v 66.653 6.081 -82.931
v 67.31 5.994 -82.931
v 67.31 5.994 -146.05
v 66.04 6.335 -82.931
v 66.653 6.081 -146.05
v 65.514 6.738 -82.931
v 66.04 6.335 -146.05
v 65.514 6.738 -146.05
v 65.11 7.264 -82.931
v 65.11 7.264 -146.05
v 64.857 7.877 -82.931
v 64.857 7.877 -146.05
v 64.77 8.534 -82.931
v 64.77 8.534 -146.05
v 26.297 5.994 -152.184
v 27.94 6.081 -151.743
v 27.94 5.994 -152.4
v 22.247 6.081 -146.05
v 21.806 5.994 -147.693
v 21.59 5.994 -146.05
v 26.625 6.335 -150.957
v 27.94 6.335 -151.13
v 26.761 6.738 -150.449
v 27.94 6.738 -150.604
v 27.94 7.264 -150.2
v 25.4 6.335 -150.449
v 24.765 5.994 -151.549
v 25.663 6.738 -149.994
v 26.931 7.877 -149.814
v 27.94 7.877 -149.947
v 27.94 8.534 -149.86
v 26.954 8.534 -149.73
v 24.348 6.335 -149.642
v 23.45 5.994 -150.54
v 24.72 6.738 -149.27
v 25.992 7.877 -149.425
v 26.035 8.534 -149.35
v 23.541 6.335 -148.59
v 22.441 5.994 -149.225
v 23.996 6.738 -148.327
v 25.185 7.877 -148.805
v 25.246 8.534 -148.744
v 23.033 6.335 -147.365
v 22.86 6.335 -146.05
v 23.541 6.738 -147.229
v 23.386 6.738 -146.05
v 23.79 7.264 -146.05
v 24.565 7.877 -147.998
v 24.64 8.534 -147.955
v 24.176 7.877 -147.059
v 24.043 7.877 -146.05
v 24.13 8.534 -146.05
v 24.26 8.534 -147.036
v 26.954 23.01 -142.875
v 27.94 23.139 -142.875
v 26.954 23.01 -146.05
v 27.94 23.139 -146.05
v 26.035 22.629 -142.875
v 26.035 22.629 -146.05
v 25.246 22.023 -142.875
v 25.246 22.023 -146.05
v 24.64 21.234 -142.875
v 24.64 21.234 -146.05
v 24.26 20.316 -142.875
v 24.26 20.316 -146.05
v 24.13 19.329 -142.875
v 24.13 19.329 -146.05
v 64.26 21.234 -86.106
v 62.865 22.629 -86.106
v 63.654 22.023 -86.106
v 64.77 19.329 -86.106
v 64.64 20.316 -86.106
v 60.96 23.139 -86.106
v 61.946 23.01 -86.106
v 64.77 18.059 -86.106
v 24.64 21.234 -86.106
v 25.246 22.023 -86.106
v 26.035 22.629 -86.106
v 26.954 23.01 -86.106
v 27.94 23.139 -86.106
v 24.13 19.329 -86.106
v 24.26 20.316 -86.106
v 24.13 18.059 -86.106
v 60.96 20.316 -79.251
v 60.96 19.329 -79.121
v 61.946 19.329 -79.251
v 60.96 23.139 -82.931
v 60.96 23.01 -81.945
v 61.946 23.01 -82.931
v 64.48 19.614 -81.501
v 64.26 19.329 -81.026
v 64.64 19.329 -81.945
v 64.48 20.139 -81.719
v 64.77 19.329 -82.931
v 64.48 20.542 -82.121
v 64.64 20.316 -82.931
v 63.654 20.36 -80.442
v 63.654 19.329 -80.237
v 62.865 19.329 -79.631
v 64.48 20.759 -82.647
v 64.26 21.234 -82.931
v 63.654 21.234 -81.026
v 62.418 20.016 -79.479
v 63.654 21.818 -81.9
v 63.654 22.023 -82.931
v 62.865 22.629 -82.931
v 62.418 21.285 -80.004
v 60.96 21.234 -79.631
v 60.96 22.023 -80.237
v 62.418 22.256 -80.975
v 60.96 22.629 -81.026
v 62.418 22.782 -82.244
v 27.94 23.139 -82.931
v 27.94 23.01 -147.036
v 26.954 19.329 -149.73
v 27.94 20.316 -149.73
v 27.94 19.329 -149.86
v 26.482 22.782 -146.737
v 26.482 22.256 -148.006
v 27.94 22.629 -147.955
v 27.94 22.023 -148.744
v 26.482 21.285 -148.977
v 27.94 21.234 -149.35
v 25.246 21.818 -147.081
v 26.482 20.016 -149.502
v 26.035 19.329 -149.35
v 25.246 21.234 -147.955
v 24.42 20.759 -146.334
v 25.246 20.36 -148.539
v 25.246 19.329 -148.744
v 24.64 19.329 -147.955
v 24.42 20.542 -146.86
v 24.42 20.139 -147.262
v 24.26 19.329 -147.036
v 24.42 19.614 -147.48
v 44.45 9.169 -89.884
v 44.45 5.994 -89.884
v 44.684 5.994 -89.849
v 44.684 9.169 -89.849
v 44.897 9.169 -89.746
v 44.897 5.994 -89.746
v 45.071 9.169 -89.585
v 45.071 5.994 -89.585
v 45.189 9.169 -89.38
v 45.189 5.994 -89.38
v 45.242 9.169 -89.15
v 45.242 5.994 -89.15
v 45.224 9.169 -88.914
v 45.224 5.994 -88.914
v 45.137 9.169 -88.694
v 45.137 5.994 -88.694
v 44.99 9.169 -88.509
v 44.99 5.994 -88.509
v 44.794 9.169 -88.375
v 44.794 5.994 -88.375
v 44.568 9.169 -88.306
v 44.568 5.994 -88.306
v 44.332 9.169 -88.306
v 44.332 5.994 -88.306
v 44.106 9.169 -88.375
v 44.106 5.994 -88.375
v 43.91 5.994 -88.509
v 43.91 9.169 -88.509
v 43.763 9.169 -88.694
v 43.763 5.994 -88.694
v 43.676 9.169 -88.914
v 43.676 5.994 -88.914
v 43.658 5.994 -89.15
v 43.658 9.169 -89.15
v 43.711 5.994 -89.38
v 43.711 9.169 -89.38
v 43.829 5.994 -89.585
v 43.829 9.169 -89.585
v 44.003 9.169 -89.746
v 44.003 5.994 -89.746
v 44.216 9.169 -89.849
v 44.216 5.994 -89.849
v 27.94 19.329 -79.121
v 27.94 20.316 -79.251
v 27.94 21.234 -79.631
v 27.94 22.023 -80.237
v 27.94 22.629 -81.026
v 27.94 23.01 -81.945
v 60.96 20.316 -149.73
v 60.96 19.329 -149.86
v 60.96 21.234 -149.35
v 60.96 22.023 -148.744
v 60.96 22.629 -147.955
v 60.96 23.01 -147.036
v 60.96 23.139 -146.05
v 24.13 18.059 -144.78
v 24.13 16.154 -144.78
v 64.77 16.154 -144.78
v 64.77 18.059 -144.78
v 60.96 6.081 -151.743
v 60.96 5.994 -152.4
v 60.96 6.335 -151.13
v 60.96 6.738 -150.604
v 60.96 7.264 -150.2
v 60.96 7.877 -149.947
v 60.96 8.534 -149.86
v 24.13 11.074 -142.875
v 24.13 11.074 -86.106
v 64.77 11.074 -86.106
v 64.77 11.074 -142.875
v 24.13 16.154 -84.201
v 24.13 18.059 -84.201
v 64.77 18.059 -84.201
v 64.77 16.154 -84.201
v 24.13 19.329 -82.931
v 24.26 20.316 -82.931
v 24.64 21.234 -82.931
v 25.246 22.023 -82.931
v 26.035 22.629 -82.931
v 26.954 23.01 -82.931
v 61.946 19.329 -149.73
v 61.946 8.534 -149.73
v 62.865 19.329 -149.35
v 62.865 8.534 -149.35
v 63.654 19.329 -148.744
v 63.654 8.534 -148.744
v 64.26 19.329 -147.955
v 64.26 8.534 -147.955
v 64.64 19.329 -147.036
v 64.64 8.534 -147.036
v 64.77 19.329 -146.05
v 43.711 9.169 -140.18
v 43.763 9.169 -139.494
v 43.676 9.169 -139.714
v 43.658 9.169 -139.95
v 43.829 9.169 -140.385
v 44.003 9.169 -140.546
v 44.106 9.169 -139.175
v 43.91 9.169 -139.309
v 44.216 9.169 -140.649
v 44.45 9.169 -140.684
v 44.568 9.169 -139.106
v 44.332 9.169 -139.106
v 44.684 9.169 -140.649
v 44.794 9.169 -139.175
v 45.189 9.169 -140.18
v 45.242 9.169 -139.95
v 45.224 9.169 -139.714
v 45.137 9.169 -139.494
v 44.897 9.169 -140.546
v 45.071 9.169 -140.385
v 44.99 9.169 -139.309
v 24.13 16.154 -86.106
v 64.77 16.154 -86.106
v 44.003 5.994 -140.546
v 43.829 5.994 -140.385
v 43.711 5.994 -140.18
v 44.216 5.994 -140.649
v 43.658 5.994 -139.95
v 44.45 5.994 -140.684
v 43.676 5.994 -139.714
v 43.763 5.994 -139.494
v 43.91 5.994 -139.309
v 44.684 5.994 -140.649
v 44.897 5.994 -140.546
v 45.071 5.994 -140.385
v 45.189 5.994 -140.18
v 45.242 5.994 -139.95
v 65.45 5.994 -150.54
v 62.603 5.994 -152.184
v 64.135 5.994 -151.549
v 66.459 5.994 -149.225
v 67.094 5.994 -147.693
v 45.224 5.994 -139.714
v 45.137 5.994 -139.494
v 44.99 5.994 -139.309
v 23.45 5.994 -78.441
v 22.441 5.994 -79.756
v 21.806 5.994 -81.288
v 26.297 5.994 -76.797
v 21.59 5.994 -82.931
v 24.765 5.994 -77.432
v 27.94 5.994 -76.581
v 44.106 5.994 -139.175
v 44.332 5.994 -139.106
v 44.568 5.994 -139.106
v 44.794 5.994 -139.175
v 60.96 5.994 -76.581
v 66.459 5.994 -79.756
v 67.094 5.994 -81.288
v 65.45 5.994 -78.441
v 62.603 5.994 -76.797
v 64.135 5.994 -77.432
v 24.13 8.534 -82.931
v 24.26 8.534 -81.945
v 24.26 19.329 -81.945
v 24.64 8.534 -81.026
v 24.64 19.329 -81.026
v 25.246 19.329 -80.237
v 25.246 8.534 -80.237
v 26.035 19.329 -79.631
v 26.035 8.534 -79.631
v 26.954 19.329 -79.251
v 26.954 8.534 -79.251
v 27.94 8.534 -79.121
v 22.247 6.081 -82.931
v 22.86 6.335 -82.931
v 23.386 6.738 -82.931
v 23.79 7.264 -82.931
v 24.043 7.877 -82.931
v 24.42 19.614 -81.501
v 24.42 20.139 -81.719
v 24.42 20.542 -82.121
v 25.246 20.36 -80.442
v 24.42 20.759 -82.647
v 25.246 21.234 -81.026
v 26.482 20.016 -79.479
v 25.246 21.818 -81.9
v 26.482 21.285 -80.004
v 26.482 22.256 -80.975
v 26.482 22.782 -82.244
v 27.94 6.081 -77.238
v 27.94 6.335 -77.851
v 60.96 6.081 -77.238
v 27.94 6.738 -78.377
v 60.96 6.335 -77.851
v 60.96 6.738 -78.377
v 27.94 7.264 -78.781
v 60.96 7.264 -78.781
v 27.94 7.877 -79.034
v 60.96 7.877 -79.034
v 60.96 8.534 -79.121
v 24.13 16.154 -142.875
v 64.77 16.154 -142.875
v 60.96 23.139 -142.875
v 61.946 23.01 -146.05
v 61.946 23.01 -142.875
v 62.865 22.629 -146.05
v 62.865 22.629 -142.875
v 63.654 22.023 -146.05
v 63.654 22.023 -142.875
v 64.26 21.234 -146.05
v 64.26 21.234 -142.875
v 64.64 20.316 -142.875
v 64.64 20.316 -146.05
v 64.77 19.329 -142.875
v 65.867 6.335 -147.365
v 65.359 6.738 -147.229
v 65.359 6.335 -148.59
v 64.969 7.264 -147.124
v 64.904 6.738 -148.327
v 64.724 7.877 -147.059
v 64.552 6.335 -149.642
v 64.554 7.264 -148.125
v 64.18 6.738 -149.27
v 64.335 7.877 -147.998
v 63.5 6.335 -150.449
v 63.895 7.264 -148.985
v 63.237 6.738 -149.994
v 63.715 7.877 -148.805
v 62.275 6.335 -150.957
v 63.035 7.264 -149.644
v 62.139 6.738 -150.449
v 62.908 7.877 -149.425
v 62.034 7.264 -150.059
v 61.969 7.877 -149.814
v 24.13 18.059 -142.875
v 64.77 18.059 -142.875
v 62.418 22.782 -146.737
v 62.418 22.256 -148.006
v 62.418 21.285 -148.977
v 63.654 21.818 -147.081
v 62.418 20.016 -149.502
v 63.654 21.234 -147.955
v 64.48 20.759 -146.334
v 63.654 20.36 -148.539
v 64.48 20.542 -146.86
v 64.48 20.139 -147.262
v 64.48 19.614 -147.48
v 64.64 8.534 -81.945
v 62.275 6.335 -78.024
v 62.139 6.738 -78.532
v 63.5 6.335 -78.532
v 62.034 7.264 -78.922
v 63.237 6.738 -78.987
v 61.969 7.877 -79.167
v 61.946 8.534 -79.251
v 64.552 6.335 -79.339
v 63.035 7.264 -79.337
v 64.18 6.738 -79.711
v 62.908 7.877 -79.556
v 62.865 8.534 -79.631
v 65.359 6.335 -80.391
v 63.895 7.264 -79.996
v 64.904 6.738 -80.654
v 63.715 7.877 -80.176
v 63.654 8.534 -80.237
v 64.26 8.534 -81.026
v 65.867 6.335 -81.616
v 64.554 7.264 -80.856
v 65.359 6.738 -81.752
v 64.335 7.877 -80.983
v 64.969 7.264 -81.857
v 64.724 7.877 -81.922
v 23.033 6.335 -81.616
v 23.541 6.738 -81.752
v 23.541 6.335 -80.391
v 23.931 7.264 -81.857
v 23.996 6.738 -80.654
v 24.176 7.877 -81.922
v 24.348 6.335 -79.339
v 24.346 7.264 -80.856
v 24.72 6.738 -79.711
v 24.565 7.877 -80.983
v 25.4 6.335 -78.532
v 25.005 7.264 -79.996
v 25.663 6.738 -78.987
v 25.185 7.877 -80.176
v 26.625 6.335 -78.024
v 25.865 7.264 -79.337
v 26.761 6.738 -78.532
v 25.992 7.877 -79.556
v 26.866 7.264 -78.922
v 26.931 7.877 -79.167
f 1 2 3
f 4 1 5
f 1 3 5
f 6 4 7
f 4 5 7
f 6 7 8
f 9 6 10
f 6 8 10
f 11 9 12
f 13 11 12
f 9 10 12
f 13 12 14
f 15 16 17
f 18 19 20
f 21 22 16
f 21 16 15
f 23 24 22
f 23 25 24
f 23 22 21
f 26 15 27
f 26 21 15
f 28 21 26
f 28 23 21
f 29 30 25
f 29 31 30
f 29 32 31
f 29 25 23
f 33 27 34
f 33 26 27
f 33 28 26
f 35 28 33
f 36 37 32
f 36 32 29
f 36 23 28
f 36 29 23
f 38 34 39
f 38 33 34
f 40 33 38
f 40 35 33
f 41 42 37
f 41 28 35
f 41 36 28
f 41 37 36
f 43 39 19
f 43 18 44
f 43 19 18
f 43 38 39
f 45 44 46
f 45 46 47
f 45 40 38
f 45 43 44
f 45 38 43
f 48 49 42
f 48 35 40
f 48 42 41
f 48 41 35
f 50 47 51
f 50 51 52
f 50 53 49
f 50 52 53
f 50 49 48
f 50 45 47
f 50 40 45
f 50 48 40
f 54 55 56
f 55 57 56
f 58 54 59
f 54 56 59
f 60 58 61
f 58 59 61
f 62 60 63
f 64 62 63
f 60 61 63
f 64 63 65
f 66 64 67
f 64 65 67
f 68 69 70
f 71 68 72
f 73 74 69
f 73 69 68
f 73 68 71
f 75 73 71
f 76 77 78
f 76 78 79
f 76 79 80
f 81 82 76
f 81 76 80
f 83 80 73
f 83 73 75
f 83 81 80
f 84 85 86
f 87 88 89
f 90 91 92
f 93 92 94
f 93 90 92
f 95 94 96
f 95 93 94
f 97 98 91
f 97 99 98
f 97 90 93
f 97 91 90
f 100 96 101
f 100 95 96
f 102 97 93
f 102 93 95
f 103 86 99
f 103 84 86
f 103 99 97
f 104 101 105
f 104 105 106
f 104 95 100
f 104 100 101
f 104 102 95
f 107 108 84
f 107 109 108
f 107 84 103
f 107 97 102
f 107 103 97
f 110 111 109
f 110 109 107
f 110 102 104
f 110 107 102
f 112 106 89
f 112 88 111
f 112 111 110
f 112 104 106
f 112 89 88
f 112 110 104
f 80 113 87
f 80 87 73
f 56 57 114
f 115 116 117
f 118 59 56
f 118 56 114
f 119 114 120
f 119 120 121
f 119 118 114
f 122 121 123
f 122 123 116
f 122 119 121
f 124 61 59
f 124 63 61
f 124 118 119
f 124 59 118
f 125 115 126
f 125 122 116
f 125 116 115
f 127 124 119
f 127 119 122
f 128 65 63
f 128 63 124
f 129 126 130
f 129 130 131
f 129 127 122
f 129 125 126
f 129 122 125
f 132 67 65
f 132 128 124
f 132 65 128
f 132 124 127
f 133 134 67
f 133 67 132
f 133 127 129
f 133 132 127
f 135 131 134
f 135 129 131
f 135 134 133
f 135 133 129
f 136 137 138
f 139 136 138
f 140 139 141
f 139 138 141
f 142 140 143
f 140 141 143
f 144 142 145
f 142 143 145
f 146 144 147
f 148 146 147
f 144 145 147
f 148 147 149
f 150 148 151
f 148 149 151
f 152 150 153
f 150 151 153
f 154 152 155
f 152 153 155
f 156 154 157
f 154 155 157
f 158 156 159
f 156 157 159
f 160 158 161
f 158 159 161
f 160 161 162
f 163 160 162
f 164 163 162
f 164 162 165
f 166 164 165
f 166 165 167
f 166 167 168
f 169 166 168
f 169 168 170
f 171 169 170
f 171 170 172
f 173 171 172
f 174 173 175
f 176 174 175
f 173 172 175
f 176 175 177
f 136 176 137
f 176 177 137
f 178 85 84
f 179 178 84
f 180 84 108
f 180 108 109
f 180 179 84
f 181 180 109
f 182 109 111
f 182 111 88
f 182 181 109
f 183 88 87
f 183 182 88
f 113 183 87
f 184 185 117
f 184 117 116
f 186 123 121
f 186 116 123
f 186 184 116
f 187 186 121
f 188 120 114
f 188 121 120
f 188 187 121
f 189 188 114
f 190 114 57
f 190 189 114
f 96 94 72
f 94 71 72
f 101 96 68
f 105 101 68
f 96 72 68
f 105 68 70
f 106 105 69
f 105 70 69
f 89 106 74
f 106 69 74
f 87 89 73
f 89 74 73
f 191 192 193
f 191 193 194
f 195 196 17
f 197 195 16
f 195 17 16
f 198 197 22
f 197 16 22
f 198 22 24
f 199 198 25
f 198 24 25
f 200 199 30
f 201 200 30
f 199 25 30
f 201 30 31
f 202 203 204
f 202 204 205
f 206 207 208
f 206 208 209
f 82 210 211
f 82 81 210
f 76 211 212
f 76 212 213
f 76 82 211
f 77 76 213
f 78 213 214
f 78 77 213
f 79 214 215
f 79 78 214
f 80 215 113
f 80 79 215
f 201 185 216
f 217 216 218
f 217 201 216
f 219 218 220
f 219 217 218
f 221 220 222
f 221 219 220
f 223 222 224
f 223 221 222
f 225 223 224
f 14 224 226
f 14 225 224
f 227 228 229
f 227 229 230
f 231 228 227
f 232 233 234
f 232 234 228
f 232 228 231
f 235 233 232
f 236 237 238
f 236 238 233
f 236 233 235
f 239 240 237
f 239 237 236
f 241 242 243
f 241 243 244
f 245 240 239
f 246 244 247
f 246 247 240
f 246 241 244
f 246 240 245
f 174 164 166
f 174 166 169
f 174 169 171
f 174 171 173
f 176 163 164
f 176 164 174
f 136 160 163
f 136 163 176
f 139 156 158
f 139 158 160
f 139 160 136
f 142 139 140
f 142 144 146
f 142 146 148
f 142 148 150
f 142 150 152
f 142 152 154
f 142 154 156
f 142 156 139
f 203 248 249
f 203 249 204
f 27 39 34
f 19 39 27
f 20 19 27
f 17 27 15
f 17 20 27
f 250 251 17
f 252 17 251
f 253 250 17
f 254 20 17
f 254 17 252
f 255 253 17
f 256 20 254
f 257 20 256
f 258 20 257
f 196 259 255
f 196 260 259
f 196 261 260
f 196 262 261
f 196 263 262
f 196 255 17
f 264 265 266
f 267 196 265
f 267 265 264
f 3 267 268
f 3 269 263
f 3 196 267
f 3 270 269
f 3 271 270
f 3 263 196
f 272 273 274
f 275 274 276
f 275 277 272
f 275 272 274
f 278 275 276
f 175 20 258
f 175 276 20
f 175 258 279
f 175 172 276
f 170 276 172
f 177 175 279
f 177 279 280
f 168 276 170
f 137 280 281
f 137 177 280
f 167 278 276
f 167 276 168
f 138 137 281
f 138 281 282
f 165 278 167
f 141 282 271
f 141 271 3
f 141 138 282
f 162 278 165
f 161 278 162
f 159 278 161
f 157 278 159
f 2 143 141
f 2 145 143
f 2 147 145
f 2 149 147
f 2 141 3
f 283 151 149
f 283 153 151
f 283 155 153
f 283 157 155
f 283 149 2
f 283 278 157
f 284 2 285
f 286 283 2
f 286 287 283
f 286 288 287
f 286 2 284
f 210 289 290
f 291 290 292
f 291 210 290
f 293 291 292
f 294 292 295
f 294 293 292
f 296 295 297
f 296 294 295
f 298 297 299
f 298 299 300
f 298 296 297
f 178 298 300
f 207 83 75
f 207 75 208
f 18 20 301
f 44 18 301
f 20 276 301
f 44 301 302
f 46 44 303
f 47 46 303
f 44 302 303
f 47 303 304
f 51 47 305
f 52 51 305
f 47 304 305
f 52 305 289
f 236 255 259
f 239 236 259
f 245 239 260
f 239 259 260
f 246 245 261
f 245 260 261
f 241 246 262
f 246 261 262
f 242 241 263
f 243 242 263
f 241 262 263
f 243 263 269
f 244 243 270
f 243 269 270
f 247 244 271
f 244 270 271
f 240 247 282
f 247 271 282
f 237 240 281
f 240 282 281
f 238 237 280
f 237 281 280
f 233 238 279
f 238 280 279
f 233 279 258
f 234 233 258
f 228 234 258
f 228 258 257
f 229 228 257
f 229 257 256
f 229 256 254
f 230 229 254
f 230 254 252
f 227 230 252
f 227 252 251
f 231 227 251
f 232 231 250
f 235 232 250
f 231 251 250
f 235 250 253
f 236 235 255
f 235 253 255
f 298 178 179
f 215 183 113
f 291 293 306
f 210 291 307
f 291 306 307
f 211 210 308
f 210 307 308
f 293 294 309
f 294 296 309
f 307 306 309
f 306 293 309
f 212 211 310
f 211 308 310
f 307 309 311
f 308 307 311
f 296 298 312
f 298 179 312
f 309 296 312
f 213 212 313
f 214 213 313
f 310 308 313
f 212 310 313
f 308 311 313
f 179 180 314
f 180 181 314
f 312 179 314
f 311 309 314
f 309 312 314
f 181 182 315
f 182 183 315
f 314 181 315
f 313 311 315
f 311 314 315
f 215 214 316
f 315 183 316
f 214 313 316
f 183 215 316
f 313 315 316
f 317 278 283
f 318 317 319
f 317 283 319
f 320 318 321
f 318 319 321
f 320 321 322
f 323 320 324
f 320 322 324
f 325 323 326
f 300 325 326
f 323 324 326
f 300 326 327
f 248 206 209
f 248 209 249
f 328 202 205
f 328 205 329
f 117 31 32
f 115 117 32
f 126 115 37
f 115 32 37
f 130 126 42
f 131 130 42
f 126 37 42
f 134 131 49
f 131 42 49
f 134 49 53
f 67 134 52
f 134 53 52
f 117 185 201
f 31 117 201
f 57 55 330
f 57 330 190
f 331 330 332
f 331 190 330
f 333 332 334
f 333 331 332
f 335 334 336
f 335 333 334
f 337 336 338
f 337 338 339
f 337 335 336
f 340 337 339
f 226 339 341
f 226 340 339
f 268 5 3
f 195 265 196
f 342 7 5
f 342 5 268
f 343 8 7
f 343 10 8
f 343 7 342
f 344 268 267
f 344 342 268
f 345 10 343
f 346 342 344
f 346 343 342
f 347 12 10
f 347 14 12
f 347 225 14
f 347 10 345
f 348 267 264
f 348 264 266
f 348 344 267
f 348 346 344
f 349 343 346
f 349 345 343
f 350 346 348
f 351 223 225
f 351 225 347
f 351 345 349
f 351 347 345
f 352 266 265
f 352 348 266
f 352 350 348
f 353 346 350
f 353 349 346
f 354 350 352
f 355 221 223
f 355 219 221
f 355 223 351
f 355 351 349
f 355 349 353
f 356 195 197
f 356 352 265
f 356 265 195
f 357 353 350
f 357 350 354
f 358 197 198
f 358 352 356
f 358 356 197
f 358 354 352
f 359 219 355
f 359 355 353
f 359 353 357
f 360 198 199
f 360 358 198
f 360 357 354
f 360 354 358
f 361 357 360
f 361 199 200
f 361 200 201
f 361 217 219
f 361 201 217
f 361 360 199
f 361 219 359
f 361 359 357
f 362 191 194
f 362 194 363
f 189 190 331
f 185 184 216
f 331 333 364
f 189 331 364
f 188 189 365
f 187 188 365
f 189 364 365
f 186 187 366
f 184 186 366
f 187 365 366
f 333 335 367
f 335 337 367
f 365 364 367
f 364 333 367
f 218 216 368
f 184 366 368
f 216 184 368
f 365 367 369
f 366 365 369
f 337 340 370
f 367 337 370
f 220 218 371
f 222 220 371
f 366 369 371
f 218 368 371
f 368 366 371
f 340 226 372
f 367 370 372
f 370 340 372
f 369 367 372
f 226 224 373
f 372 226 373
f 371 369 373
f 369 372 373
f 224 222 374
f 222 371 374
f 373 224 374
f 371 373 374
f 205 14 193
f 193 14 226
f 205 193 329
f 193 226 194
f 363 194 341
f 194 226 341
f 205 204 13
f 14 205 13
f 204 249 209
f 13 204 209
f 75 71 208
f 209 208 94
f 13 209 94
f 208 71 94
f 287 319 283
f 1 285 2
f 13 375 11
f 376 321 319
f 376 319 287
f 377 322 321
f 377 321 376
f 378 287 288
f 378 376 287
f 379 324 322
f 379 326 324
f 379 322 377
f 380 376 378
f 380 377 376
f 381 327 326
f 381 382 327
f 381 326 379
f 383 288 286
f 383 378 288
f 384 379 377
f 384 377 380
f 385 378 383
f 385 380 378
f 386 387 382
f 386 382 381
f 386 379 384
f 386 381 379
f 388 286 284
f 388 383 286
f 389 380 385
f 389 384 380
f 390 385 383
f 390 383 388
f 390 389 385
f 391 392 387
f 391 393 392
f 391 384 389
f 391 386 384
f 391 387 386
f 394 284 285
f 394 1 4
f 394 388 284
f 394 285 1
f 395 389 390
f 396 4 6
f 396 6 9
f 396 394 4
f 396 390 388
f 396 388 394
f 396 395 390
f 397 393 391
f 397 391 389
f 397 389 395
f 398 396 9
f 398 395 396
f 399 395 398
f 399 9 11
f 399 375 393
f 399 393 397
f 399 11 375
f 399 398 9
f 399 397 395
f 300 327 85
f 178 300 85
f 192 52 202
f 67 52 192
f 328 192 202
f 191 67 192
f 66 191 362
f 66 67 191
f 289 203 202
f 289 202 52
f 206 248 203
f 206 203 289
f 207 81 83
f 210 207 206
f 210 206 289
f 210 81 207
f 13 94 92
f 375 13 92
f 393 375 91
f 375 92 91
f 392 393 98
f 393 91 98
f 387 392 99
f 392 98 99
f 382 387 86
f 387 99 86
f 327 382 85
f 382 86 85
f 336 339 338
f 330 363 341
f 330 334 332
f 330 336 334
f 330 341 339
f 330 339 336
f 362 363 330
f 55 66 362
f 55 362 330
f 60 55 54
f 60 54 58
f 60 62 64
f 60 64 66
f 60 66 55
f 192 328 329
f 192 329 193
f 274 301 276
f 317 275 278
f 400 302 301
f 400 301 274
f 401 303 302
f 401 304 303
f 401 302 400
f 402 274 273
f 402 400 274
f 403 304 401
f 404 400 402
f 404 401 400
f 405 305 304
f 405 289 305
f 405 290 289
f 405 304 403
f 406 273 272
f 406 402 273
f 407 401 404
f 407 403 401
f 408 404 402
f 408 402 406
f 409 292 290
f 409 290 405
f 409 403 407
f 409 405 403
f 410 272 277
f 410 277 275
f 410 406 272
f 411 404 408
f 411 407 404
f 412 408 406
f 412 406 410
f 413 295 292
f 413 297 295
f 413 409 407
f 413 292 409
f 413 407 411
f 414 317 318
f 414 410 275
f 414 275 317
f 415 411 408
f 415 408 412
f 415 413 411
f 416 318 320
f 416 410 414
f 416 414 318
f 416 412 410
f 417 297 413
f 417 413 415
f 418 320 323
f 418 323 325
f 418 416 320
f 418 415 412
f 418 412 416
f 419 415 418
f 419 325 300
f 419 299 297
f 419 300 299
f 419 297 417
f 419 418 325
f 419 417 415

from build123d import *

# Parameters (mm, degrees)
SKETCH2_W               = 88.9
SKETCH2_H               = 152.4
BOSS_EXTRUDE1_DEPTH     = 5.9944
CUT_EXTRUDE2_DEPTH      = 177.535840076
CUT_EXTRUDE2_DEPTH_BACK = 177.535840076
SKETCH4_R               = 2.7305
BOSS_EXTRUDE2_DEPTH     = 101.6
FILLET1_R               = 3.81
FILLET2_R               = 2.54
BOSS_EXTRUDE3_DEPTH     = 20.32
FILLET3_R               = 3.81
FILLET6_R               = 3.81
FILLET7_R               = 2.54
CUT_EXTRUDE3_DEPTH      = 204.596488182
CUT_EXTRUDE3_DEPTH_BACK = 204.596488182
SKETCH7_W               = 2.54
SKETCH7_H               = 152.4
SKETCH8_W               = 86.36
SKETCH8_H               = 152.4
CUT_EXTRUDE4_DEPTH      = 5.9944
SKETCH9_R               = 0.79375
CUT_EXTRUDE5_DEPTH      = 3.175


with BuildPart() as part:
    # Sketch2 → Boss-Extrude1 (new body)
    with BuildSketch(Plane(origin=(0, 0, 0), x_dir=(1, 0, 0), z_dir=(0, 1, 0))):
        with Locations((44.45, 76.2)):
            Rectangle(SKETCH2_W, SKETCH2_H)
    extrude(amount=BOSS_EXTRUDE1_DEPTH)

    # Sketch4 → Cut-Extrude2 (cut, two sides: drawn at the far end of the back side and taken through both)
    with BuildSketch(Plane(origin=(0, 5.9944, 0), x_dir=(1, 0, 0), z_dir=(0, 1, 0)).offset(-CUT_EXTRUDE2_DEPTH_BACK)):
        with Locations(Location((45.72, 109.871331367, 0), (0, 0, 270))):
            Circle(SKETCH4_R)
        with Locations(Location((45.72, 33.671331367, 0), (0, 0, 270))):
            Circle(SKETCH4_R)
    extrude(amount=CUT_EXTRUDE2_DEPTH + CUT_EXTRUDE2_DEPTH_BACK, mode=Mode.SUBTRACT)

    # Sketch5 → Boss-Extrude2 (add)
    with BuildSketch(Plane(origin=(0, 5.9944, 0), x_dir=(1, 0, 0), z_dir=(0, 1, 0))):
        Polygon((18.542, 15.748), (12.446, 15.748), (12.446, 2.54), (76.454, 2.54), (76.454, 15.748), (70.358, 15.748), (70.358, 13.208), (71.374, 13.208), (71.374, 11.43), (70.358, 11.43), (70.358, 7.62), (18.542, 7.62), (18.542, 11.43), (17.526, 11.43), (17.526, 13.208), (18.542, 13.208), align=None)
    extrude(amount=BOSS_EXTRUDE2_DEPTH)

    # Fillet1
    fillet1_edges = [part.edges().sort_by_distance(p)[0] for p in [
        (12.446, 56.7944, -15.748),
        (12.446, 56.7944, -2.54),
        (76.454, 56.7944, -2.54),
        (76.454, 56.7944, -15.748),
    ]]
    fillet(fillet1_edges, radius=FILLET1_R)

    # Fillet2
    fillet2_edges = [part.edges().sort_by_distance(p)[0] for p in [
        (71.501, 5.9944, -15.748),
        (44.45, 5.9944, -2.54),
        (12.446, 5.9944, -9.144),
        (17.399, 5.9944, -15.748),
        (76.454, 5.9944, -9.144),
        (13.561923164, 5.9944, -3.655923164),
        (13.561923164, 5.9944, -14.632076836),
        (75.338076836, 5.9944, -3.655923164),
        (75.338076836, 5.9944, -14.632076836),
    ]]
    fillet(fillet2_edges, radius=FILLET2_R - 0.0001)  # a hair under: the kernel refuses the full size

    # Sketch6 → Boss-Extrude3 (add, symmetric)
    with BuildSketch(Plane.ZY.offset(-44.45)):
        Polygon((-149.86, 5.9944), (-79.121, 5.9944), (-79.121, 23.1394), (-86.106, 23.1394), (-86.106, 18.0594), (-84.201, 18.0594), (-84.201, 16.1544), (-86.106, 16.1544), (-86.106, 11.0744), (-142.875, 11.0744), (-142.875, 16.1544), (-144.78, 16.1544), (-144.78, 18.0594), (-142.875, 18.0594), (-142.875, 23.1394), (-149.86, 23.1394), align=None)
    extrude(amount=BOSS_EXTRUDE3_DEPTH, both=True)

    # Fillet3
    fillet3_edges = [part.edges().sort_by_distance(p)[0] for p in [
        (44.45, 23.1394, -149.86),
        (44.45, 23.1394, -79.121),
    ]]
    fillet(fillet3_edges, radius=FILLET3_R)

    # Fillet6
    fillet6_edges = [part.edges().sort_by_distance(p)[0] for p in [
        (24.13, 12.6619, -149.86),
        (64.77, 12.6619, -79.121),
        (24.13, 23.1394, -84.5185),
        (24.13, 12.6619, -79.121),
        (64.77, 23.1394, -84.5185),
        (64.77, 12.6619, -149.86),
        (64.77, 23.1394, -144.4625),
        (64.77, 22.023476836, -148.744076836),
        (64.77, 22.023476836, -80.236923164),
        (24.13, 23.1394, -144.4625),
        (24.13, 22.023476836, -148.744076836),
        (24.13, 22.023476836, -80.236923164),
    ]]
    fillet(fillet6_edges, radius=FILLET6_R)

    # Fillet7
    fillet7_edges = [part.edges().sort_by_distance(p)[0] for p in [
        (24.13, 5.9944, -114.4905),
        (64.77, 5.9944, -114.4905),
        (44.45, 5.9944, -79.121),
        (44.45, 5.9944, -149.86),
        (25.245923164, 5.9944, -80.236923164),
        (63.654076836, 5.9944, -80.236923164),
        (63.654076836, 5.9944, -148.744076836),
        (25.245923164, 5.9944, -148.744076836),
    ]]
    fillet(fillet7_edges, radius=FILLET7_R - 0.0001)  # a hair under: the kernel refuses the full size

    # Sketch7 → Cut-Extrude3 (cut, two sides: drawn at the far end of the back side and taken through both)
    with BuildSketch(Plane(origin=(0, 5.9944, 0), x_dir=(1, 0, 0), z_dir=(0, 1, 0)).offset(-CUT_EXTRUDE3_DEPTH_BACK)):
        with Locations((1.27, 76.2)):
            Rectangle(SKETCH7_W, SKETCH7_H)
    extrude(amount=CUT_EXTRUDE3_DEPTH + CUT_EXTRUDE3_DEPTH_BACK, mode=Mode.SUBTRACT)

    # Sketch8 → Cut-Extrude4 (cut)
    with BuildSketch(Plane.XZ):
        with Locations((45.72, -76.2)):
            Rectangle(SKETCH8_W, SKETCH8_H)
    extrude(amount=-CUT_EXTRUDE4_DEPTH, mode=Mode.SUBTRACT)


with BuildPart() as body_2:
    # of the pieces the cut leaves, the one that is kept (cut_extrude4_keep)
    add(part.part.solids().sort_by_distance((27.94, 8.5343, -149.86))[0])

    # Sketch9 → Cut-Extrude5 (cut)
    with BuildSketch(Plane.XZ.offset(-5.9944)):
        with Locations(Location((44.45, -89.0905, 0), (0, 0, 270))):
            Circle(SKETCH9_R)
        with Locations(Location((44.45, -139.8905, 0), (0, 0, 270))):
            Circle(SKETCH9_R)
    extrude(amount=-CUT_EXTRUDE5_DEPTH, mode=Mode.SUBTRACT)


solid = body_2.part
